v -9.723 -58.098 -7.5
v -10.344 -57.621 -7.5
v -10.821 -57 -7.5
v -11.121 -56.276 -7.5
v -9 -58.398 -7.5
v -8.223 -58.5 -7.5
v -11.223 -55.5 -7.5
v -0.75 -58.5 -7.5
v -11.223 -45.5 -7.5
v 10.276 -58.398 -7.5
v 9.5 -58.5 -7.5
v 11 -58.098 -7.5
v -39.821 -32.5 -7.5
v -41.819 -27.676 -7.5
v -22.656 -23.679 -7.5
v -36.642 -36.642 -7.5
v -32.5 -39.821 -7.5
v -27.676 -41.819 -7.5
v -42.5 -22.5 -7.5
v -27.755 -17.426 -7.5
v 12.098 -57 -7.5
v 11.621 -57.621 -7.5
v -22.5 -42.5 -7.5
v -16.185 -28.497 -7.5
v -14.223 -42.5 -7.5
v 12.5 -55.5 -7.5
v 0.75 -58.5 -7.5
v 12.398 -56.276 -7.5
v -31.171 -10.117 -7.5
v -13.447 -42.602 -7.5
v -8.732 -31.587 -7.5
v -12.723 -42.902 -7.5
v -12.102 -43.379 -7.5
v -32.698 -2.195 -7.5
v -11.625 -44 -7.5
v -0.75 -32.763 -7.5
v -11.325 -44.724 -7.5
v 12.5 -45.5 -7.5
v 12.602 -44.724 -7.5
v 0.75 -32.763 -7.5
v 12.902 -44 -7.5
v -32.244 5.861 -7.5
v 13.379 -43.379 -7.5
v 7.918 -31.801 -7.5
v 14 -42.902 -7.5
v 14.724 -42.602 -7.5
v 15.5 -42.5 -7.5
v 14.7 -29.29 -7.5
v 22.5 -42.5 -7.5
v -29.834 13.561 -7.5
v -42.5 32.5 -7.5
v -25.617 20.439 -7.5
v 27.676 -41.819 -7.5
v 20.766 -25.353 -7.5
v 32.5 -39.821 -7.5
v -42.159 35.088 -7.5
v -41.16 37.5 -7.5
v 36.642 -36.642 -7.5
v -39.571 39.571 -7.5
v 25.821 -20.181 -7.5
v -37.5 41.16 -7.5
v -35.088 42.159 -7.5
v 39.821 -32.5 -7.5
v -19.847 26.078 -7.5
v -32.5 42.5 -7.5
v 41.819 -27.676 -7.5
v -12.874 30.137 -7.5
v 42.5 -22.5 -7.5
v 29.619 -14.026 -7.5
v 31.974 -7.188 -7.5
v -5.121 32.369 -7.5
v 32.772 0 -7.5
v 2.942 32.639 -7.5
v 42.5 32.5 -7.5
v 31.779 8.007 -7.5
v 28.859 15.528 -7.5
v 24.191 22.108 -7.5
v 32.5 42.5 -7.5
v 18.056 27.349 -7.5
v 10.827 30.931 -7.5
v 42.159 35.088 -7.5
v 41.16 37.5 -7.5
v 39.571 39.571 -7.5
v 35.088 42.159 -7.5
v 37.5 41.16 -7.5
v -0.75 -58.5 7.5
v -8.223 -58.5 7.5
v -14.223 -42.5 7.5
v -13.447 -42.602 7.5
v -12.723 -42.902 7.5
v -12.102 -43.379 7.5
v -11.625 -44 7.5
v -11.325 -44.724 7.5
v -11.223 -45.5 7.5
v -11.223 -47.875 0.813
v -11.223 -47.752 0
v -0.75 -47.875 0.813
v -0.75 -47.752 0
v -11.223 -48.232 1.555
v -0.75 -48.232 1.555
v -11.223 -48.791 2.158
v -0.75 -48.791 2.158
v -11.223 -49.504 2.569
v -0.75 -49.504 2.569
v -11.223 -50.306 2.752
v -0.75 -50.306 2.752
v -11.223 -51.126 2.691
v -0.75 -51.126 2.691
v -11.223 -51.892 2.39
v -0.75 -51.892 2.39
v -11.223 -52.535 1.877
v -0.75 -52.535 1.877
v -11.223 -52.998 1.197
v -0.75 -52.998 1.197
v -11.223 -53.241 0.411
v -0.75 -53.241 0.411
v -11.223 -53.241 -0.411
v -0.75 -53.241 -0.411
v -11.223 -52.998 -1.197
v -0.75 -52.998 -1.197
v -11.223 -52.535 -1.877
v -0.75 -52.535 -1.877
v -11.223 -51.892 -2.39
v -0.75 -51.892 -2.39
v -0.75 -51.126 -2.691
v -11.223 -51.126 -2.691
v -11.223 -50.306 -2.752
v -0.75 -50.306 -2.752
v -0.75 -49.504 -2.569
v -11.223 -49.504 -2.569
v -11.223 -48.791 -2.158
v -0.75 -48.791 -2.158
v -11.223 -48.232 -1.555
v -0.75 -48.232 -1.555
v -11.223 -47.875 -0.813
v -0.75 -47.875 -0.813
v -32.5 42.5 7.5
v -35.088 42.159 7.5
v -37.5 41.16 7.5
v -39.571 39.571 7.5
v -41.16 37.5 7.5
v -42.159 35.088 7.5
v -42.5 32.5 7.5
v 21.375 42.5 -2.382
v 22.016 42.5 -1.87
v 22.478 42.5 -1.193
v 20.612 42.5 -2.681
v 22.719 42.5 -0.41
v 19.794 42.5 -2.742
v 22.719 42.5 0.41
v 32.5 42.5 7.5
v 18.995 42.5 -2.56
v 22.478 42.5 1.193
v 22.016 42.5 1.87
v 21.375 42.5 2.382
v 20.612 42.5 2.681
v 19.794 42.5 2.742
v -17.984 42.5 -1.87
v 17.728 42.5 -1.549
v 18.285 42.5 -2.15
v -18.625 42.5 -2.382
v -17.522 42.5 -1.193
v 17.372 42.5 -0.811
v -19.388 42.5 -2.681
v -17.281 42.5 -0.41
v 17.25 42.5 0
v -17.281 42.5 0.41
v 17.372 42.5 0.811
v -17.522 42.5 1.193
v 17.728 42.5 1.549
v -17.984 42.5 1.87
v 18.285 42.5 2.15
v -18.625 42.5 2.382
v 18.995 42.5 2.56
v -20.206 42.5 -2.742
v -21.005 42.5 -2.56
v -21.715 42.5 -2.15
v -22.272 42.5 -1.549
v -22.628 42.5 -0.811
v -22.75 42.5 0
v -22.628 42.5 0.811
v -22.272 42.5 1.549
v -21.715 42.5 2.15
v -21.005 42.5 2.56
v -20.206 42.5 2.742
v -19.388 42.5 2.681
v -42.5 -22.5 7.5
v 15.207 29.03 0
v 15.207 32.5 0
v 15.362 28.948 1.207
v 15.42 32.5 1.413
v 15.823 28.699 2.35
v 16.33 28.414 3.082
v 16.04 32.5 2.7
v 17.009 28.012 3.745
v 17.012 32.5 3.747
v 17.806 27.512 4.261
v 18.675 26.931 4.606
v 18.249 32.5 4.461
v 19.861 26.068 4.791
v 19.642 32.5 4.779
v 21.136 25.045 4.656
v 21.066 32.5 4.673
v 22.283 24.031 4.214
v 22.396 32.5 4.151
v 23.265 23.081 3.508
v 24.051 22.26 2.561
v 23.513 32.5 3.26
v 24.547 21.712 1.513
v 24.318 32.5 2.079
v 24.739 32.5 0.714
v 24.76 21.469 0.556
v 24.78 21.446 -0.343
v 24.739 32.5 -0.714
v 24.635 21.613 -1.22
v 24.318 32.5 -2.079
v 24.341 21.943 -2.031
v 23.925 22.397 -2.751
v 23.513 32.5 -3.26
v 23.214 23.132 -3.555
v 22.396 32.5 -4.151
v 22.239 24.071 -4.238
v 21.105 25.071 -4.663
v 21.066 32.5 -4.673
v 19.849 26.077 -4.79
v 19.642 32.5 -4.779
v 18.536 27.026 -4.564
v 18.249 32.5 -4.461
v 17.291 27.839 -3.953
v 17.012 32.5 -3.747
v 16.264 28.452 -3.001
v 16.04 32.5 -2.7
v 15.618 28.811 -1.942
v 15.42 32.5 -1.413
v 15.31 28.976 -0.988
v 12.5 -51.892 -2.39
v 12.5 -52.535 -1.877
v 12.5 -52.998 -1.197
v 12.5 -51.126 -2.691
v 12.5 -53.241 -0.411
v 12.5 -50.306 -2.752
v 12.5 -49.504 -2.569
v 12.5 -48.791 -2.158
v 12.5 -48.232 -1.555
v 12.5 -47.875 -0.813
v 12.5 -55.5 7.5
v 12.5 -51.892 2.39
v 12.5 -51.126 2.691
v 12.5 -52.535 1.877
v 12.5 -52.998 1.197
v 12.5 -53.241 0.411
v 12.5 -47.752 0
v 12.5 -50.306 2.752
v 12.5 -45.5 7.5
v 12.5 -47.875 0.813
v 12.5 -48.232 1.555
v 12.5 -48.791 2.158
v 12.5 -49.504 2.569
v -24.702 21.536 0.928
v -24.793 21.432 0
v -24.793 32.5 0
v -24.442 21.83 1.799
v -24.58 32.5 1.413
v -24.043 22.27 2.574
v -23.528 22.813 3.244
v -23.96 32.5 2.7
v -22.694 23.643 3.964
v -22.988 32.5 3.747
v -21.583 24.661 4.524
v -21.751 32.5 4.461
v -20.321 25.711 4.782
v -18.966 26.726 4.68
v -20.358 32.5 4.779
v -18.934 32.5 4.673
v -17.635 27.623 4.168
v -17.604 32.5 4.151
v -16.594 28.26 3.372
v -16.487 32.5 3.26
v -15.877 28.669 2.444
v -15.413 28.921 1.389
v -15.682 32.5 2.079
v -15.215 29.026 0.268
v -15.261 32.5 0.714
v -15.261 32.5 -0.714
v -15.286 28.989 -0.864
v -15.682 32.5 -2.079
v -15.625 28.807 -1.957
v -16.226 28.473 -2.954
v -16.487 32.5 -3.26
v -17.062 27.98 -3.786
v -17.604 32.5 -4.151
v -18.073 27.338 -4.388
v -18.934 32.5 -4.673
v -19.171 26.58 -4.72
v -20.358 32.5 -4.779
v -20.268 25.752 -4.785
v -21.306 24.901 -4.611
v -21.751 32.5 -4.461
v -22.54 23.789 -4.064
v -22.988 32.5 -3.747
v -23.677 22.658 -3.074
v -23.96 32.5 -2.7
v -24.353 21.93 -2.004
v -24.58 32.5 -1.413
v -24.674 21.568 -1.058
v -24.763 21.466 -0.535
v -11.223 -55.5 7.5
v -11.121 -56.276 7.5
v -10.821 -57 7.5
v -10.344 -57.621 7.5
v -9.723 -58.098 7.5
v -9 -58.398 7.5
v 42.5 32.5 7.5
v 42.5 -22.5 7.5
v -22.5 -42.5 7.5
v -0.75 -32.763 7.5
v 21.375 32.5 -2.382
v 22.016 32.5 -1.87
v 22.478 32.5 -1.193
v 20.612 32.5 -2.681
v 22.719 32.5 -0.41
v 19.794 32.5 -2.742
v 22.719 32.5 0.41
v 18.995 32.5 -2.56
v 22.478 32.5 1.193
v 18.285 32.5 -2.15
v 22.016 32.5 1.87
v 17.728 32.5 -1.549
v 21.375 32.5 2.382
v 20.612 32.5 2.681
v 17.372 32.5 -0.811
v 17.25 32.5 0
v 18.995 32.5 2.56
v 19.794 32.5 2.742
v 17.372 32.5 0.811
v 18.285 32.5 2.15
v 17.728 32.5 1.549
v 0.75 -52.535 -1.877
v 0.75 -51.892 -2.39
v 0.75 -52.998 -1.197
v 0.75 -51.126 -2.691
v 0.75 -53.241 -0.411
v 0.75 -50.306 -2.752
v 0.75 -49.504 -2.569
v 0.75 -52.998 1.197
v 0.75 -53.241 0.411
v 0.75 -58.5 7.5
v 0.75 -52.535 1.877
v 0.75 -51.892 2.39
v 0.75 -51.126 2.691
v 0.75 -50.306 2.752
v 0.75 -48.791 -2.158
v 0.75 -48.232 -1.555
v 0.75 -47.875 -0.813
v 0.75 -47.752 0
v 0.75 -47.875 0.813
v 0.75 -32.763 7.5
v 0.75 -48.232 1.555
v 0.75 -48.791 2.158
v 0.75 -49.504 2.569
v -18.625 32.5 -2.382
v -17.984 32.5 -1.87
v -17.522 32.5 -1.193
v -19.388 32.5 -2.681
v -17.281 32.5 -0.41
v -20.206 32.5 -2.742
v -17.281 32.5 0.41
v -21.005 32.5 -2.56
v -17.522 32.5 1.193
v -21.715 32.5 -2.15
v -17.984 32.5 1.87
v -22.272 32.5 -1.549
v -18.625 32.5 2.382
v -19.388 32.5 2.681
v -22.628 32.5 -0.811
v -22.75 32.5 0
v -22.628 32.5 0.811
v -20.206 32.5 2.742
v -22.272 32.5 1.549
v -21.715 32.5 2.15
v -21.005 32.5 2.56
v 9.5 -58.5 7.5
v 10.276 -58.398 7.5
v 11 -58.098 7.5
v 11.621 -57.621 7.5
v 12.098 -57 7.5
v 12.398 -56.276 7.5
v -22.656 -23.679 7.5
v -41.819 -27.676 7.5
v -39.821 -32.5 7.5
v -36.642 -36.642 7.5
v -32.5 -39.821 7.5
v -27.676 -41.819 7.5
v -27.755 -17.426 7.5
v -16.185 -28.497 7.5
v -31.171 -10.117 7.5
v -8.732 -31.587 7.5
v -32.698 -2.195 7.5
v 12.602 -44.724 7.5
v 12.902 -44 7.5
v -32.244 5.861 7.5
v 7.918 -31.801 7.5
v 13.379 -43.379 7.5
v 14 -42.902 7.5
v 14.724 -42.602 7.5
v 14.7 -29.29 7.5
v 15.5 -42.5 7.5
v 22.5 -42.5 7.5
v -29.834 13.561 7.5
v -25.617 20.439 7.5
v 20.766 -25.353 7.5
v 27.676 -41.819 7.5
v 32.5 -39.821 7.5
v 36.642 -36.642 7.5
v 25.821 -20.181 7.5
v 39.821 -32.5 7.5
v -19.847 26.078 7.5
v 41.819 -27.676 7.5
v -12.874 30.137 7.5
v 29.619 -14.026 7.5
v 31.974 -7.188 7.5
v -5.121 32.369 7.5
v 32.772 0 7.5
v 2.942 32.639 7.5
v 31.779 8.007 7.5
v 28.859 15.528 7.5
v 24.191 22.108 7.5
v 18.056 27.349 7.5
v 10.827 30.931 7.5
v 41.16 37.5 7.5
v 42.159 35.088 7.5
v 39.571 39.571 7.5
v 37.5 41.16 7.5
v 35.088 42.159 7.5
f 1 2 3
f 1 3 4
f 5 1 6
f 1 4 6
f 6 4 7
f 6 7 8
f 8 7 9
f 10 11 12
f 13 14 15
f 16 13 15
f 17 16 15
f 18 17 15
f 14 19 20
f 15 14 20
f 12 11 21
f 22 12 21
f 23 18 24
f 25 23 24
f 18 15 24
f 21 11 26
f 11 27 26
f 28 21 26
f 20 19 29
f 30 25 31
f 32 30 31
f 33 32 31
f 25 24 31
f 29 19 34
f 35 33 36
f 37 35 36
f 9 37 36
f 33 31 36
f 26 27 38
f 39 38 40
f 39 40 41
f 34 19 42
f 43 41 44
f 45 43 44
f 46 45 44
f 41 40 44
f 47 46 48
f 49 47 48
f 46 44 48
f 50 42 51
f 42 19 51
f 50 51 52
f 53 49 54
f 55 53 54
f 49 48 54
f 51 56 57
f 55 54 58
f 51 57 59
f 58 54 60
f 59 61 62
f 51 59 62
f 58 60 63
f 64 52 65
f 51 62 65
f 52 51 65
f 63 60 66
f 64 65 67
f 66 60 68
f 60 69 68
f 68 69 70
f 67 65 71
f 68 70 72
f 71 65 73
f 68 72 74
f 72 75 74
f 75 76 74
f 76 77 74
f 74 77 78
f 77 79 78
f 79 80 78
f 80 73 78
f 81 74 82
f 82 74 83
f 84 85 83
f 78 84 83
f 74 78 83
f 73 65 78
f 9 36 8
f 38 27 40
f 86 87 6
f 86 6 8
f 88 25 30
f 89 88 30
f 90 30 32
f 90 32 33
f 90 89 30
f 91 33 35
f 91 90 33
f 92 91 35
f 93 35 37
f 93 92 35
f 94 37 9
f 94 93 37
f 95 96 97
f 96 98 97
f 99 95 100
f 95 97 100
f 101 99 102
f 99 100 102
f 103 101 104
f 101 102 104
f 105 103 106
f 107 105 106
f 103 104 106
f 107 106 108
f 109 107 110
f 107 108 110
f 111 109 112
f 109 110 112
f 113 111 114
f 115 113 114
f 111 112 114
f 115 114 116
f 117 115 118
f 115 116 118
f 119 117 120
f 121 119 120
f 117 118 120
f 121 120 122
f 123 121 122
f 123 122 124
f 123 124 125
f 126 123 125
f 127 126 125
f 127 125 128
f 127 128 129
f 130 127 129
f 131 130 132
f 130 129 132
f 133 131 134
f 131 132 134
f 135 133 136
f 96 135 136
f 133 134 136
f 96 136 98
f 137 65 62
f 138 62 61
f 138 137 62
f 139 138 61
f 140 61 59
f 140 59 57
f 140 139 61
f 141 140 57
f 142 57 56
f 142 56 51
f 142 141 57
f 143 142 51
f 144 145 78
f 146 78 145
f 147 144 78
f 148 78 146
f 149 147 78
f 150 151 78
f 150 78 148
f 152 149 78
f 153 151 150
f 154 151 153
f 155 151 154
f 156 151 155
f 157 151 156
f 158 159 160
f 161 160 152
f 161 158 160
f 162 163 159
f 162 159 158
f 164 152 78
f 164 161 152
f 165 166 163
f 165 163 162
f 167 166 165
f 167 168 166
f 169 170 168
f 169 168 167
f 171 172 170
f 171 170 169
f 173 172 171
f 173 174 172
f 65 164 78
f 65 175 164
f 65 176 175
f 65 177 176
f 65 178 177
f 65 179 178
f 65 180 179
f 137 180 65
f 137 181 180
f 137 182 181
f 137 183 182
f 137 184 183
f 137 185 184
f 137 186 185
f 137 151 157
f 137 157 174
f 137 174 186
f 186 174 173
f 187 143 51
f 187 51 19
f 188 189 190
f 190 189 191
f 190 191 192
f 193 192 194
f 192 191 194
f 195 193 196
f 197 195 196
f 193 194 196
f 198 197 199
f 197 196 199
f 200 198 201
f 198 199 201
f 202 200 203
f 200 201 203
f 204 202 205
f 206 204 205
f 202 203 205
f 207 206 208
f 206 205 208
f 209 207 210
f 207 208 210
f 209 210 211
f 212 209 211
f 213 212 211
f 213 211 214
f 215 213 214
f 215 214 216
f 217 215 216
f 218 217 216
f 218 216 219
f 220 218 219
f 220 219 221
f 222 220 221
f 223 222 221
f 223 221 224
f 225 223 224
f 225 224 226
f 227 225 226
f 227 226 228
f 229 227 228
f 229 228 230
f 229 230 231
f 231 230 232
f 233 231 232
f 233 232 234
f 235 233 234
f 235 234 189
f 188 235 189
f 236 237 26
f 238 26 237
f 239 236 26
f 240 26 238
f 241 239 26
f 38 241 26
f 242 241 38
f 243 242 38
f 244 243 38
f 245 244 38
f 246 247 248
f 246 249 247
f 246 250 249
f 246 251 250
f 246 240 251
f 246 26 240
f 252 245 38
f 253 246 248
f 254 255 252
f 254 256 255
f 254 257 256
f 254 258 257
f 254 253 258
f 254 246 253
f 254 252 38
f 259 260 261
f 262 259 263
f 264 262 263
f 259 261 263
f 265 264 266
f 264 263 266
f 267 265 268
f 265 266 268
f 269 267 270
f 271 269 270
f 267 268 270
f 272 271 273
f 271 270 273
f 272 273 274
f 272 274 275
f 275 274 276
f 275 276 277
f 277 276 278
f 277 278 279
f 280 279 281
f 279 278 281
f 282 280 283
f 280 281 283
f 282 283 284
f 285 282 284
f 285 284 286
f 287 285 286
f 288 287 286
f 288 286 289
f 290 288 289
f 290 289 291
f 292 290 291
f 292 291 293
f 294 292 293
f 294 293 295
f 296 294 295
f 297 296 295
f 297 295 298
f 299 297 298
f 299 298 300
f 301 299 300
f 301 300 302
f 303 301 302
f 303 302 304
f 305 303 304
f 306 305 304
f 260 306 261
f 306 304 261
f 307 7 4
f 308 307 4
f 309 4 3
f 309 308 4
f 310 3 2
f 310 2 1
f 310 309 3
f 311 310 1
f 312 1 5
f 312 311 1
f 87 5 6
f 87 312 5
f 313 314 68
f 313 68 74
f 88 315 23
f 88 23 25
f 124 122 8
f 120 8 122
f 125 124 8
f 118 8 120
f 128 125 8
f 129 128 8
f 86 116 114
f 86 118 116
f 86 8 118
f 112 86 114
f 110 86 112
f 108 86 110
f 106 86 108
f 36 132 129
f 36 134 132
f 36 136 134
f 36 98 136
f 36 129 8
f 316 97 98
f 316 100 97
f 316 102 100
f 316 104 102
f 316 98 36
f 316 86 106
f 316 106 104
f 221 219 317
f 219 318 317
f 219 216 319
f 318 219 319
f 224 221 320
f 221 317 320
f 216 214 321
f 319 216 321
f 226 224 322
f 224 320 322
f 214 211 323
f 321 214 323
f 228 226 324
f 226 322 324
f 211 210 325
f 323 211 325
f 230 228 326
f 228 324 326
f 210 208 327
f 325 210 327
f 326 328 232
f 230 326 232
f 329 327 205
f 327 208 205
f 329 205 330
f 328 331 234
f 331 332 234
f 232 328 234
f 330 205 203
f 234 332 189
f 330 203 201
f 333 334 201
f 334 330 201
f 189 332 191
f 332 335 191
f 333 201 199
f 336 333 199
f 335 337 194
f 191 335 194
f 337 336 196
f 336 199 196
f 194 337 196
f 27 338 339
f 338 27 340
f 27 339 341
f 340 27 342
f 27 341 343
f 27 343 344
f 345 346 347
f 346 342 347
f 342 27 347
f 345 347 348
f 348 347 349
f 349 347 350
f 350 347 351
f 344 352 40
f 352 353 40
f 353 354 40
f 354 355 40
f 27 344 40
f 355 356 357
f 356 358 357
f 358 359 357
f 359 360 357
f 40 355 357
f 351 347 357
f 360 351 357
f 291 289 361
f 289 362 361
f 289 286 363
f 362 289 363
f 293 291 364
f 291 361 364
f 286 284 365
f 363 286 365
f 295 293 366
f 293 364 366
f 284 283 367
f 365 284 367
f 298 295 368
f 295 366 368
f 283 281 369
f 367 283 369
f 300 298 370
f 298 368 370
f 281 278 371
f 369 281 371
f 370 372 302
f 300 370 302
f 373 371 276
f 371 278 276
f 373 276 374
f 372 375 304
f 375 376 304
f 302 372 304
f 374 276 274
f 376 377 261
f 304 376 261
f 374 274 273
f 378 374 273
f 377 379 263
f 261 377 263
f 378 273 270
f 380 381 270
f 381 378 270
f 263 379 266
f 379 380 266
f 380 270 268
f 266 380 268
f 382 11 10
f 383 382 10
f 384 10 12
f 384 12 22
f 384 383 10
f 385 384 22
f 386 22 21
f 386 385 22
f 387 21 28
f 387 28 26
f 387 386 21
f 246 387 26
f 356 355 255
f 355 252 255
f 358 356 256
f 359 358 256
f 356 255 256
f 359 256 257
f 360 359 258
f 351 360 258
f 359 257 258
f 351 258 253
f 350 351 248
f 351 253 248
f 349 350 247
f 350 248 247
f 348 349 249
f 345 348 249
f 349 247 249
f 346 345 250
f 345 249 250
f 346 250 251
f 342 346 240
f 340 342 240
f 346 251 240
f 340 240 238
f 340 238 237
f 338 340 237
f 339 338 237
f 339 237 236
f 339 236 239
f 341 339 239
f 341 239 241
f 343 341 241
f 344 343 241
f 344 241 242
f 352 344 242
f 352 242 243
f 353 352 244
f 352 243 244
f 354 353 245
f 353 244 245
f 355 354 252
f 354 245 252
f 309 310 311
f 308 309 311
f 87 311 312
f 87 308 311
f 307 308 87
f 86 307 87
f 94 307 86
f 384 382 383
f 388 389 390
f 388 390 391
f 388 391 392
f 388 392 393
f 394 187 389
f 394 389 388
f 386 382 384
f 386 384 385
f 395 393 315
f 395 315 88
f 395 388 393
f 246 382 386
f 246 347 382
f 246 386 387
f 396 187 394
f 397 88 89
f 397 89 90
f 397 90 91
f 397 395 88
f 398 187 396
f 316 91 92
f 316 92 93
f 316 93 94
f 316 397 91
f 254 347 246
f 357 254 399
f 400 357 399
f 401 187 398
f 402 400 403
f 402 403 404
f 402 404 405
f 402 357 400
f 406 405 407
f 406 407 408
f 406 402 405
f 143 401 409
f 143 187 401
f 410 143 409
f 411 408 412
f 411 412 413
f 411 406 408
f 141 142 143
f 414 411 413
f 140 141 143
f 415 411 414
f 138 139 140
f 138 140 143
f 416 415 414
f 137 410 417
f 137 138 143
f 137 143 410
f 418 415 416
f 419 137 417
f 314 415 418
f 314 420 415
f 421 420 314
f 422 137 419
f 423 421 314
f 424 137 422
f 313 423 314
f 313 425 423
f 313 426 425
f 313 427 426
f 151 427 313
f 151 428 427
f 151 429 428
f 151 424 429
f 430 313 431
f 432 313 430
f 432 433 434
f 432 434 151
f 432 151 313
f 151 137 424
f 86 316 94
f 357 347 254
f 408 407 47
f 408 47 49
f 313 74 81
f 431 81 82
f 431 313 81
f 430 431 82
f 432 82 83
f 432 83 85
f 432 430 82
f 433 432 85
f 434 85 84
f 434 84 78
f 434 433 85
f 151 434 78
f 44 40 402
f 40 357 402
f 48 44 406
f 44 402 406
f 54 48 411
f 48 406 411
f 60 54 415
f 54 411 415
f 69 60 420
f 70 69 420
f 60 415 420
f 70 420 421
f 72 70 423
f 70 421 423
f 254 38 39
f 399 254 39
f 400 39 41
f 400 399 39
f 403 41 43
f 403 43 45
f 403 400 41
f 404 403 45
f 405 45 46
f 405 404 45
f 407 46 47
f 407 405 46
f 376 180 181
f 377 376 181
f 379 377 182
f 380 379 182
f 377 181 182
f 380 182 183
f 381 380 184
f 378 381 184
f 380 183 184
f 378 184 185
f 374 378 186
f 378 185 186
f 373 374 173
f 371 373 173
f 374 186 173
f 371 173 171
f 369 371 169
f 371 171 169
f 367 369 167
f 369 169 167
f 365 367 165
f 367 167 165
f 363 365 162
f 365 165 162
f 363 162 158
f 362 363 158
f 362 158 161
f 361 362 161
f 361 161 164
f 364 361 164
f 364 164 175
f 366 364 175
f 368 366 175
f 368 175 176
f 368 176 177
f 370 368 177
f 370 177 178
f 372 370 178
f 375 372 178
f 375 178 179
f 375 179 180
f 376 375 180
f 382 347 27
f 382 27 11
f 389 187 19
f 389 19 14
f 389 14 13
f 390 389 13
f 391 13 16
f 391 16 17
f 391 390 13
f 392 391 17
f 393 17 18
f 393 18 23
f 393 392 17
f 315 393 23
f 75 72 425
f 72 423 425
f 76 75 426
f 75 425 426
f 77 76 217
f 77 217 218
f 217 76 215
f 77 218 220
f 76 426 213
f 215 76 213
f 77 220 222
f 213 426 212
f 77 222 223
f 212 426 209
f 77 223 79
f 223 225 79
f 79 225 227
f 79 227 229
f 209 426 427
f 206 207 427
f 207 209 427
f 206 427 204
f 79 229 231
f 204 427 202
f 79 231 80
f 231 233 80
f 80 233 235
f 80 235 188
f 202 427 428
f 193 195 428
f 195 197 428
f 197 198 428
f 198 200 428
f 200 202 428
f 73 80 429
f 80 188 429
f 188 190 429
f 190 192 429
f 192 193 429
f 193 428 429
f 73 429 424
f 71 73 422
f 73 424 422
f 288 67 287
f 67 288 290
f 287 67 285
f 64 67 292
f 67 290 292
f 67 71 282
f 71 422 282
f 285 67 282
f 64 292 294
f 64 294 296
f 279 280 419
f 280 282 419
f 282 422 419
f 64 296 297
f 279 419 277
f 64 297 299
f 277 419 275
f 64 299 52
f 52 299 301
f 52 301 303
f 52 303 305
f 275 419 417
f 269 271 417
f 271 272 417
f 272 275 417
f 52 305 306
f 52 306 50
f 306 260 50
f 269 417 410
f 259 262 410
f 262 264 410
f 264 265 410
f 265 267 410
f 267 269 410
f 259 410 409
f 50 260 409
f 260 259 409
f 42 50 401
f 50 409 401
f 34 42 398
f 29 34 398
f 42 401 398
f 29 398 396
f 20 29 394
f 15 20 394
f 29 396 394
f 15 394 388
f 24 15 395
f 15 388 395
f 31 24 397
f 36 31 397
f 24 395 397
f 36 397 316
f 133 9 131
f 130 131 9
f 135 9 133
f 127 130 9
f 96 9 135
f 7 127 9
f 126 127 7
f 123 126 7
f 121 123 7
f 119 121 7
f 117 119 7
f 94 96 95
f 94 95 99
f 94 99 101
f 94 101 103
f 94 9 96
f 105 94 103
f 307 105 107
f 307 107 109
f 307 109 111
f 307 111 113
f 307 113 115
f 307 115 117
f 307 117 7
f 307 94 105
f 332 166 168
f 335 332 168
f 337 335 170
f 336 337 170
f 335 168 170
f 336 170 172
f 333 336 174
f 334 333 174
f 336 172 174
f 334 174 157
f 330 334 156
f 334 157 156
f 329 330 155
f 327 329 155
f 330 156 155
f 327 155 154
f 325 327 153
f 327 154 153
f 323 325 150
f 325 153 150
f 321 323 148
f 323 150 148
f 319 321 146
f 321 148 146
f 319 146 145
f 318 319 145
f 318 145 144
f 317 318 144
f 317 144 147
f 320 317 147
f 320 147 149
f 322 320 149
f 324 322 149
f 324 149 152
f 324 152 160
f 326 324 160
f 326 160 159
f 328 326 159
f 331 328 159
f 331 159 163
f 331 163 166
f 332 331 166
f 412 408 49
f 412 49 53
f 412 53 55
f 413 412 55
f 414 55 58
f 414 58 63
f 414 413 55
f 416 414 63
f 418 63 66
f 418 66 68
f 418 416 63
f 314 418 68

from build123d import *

# Parameters (mm, degrees)
F1_DEPTH  = 7.5
F2_R      = 32.7718142907
F3_DEPTH  = 8
F4_W      = 0.75
F4_H      = 80
F5_DEPTH  = 7.5
F6_R      = 2.7597283283
F7_DEPTH  = 25
F8_R      = 2.75
F9_DEPTH  = 25
F11_START = -10
F10_R     = 4.7926746231
F11_DEPTH = 12


with BuildPart() as f1:
    # F0 (on Top) → F1 (new body, symmetric)
    with BuildSketch(Plane.XY):
        with BuildLine():
            Line((0, 42.5), (-32.5, 42.5))
            ThreePointArc((-32.5, 42.5), (-39.5710678119, 39.5710678119), (-42.5, 32.5))
            Line((-42.5, 32.5), (-42.5, 0))
            Line((-42.5, 0), (-42.5, -22.5))
            ThreePointArc((-42.5, -22.5), (-36.6421356237, -36.6421356237), (-22.5, -42.5))
            Line((-22.5, -42.5), (-14.2230435639, -42.5))
            ThreePointArc((-14.2230435639, -42.5), (-12.1017232203, -43.3786796564), (-11.2230435639, -45.5))
            Line((-11.2230435639, -45.5), (-11.2230435639, -55.5))
            ThreePointArc((-11.2230435639, -55.5), (-10.3443639075, -57.6213203436), (-8.2230435639, -58.5))
            Line((-8.2230435639, -58.5), (9.5, -58.5))
            ThreePointArc((9.5, -58.5), (11.6213203436, -57.6213203436), (12.5, -55.5))
            Line((12.5, -55.5), (12.5, -45.5))
            ThreePointArc((12.5, -45.5), (13.3786796564, -43.3786796564), (15.5, -42.5))
            Line((15.5, -42.5), (22.5, -42.5))
            ThreePointArc((22.5, -42.5), (36.6421356237, -36.6421356237), (42.5, -22.5))
            Line((42.5, -22.5), (42.5, 0))
            Line((42.5, 0), (42.5, 32.5))
            ThreePointArc((42.5, 32.5), (39.5710678119, 39.5710678119), (32.5, 42.5))
            Line((32.5, 42.5), (0, 42.5))
        make_face()
    extrude(amount=F1_DEPTH, both=True)

    # F2 (on Top) → F3 (cut, symmetric)
    with BuildSketch(Plane.XY):
        Circle(F2_R)
    extrude(amount=F3_DEPTH, both=True, mode=Mode.SUBTRACT)

    # F4 (on Top) → F5 (cut, symmetric)
    with BuildSketch(Plane.XY):
        with Locations((0.375, -40)):
            Rectangle(F4_W, F4_H)
        with Locations((-0.375, -40)):
            Rectangle(F4_W, F4_H)
    extrude(amount=F5_DEPTH, both=True, mode=Mode.SUBTRACT)

    # F6 (on Right) → F7 (cut, symmetric)
    with BuildSketch(Plane.YZ):
        with Locations((-50.511858446, 0)):
            Circle(F6_R)
    extrude(amount=F7_DEPTH, both=True, mode=Mode.SUBTRACT)

    # F8 (on face) → F9 (cut)
    with BuildSketch(Plane(origin=(0, 42.5, 0), x_dir=(-1, 0, 0), z_dir=(0, 1, 0))):
        with Locations((20, 0)):
            Circle(F8_R)
        with Locations((-20, 0)):
            Circle(F8_R)
    extrude(amount=-F9_DEPTH, mode=Mode.SUBTRACT)

    # F10 (on face) → F11 (cut)
    with BuildSketch(Plane(origin=(0, 42.5, 0), x_dir=(-1, 0, 0), z_dir=(0, 1, 0)).offset(F11_START)):
        with Locations((20, 0)):
            Circle(F10_R)
        with Locations((-20, 0)):
            Circle(F10_R)
    extrude(amount=-F11_DEPTH, mode=Mode.SUBTRACT)


solid = f1.part
